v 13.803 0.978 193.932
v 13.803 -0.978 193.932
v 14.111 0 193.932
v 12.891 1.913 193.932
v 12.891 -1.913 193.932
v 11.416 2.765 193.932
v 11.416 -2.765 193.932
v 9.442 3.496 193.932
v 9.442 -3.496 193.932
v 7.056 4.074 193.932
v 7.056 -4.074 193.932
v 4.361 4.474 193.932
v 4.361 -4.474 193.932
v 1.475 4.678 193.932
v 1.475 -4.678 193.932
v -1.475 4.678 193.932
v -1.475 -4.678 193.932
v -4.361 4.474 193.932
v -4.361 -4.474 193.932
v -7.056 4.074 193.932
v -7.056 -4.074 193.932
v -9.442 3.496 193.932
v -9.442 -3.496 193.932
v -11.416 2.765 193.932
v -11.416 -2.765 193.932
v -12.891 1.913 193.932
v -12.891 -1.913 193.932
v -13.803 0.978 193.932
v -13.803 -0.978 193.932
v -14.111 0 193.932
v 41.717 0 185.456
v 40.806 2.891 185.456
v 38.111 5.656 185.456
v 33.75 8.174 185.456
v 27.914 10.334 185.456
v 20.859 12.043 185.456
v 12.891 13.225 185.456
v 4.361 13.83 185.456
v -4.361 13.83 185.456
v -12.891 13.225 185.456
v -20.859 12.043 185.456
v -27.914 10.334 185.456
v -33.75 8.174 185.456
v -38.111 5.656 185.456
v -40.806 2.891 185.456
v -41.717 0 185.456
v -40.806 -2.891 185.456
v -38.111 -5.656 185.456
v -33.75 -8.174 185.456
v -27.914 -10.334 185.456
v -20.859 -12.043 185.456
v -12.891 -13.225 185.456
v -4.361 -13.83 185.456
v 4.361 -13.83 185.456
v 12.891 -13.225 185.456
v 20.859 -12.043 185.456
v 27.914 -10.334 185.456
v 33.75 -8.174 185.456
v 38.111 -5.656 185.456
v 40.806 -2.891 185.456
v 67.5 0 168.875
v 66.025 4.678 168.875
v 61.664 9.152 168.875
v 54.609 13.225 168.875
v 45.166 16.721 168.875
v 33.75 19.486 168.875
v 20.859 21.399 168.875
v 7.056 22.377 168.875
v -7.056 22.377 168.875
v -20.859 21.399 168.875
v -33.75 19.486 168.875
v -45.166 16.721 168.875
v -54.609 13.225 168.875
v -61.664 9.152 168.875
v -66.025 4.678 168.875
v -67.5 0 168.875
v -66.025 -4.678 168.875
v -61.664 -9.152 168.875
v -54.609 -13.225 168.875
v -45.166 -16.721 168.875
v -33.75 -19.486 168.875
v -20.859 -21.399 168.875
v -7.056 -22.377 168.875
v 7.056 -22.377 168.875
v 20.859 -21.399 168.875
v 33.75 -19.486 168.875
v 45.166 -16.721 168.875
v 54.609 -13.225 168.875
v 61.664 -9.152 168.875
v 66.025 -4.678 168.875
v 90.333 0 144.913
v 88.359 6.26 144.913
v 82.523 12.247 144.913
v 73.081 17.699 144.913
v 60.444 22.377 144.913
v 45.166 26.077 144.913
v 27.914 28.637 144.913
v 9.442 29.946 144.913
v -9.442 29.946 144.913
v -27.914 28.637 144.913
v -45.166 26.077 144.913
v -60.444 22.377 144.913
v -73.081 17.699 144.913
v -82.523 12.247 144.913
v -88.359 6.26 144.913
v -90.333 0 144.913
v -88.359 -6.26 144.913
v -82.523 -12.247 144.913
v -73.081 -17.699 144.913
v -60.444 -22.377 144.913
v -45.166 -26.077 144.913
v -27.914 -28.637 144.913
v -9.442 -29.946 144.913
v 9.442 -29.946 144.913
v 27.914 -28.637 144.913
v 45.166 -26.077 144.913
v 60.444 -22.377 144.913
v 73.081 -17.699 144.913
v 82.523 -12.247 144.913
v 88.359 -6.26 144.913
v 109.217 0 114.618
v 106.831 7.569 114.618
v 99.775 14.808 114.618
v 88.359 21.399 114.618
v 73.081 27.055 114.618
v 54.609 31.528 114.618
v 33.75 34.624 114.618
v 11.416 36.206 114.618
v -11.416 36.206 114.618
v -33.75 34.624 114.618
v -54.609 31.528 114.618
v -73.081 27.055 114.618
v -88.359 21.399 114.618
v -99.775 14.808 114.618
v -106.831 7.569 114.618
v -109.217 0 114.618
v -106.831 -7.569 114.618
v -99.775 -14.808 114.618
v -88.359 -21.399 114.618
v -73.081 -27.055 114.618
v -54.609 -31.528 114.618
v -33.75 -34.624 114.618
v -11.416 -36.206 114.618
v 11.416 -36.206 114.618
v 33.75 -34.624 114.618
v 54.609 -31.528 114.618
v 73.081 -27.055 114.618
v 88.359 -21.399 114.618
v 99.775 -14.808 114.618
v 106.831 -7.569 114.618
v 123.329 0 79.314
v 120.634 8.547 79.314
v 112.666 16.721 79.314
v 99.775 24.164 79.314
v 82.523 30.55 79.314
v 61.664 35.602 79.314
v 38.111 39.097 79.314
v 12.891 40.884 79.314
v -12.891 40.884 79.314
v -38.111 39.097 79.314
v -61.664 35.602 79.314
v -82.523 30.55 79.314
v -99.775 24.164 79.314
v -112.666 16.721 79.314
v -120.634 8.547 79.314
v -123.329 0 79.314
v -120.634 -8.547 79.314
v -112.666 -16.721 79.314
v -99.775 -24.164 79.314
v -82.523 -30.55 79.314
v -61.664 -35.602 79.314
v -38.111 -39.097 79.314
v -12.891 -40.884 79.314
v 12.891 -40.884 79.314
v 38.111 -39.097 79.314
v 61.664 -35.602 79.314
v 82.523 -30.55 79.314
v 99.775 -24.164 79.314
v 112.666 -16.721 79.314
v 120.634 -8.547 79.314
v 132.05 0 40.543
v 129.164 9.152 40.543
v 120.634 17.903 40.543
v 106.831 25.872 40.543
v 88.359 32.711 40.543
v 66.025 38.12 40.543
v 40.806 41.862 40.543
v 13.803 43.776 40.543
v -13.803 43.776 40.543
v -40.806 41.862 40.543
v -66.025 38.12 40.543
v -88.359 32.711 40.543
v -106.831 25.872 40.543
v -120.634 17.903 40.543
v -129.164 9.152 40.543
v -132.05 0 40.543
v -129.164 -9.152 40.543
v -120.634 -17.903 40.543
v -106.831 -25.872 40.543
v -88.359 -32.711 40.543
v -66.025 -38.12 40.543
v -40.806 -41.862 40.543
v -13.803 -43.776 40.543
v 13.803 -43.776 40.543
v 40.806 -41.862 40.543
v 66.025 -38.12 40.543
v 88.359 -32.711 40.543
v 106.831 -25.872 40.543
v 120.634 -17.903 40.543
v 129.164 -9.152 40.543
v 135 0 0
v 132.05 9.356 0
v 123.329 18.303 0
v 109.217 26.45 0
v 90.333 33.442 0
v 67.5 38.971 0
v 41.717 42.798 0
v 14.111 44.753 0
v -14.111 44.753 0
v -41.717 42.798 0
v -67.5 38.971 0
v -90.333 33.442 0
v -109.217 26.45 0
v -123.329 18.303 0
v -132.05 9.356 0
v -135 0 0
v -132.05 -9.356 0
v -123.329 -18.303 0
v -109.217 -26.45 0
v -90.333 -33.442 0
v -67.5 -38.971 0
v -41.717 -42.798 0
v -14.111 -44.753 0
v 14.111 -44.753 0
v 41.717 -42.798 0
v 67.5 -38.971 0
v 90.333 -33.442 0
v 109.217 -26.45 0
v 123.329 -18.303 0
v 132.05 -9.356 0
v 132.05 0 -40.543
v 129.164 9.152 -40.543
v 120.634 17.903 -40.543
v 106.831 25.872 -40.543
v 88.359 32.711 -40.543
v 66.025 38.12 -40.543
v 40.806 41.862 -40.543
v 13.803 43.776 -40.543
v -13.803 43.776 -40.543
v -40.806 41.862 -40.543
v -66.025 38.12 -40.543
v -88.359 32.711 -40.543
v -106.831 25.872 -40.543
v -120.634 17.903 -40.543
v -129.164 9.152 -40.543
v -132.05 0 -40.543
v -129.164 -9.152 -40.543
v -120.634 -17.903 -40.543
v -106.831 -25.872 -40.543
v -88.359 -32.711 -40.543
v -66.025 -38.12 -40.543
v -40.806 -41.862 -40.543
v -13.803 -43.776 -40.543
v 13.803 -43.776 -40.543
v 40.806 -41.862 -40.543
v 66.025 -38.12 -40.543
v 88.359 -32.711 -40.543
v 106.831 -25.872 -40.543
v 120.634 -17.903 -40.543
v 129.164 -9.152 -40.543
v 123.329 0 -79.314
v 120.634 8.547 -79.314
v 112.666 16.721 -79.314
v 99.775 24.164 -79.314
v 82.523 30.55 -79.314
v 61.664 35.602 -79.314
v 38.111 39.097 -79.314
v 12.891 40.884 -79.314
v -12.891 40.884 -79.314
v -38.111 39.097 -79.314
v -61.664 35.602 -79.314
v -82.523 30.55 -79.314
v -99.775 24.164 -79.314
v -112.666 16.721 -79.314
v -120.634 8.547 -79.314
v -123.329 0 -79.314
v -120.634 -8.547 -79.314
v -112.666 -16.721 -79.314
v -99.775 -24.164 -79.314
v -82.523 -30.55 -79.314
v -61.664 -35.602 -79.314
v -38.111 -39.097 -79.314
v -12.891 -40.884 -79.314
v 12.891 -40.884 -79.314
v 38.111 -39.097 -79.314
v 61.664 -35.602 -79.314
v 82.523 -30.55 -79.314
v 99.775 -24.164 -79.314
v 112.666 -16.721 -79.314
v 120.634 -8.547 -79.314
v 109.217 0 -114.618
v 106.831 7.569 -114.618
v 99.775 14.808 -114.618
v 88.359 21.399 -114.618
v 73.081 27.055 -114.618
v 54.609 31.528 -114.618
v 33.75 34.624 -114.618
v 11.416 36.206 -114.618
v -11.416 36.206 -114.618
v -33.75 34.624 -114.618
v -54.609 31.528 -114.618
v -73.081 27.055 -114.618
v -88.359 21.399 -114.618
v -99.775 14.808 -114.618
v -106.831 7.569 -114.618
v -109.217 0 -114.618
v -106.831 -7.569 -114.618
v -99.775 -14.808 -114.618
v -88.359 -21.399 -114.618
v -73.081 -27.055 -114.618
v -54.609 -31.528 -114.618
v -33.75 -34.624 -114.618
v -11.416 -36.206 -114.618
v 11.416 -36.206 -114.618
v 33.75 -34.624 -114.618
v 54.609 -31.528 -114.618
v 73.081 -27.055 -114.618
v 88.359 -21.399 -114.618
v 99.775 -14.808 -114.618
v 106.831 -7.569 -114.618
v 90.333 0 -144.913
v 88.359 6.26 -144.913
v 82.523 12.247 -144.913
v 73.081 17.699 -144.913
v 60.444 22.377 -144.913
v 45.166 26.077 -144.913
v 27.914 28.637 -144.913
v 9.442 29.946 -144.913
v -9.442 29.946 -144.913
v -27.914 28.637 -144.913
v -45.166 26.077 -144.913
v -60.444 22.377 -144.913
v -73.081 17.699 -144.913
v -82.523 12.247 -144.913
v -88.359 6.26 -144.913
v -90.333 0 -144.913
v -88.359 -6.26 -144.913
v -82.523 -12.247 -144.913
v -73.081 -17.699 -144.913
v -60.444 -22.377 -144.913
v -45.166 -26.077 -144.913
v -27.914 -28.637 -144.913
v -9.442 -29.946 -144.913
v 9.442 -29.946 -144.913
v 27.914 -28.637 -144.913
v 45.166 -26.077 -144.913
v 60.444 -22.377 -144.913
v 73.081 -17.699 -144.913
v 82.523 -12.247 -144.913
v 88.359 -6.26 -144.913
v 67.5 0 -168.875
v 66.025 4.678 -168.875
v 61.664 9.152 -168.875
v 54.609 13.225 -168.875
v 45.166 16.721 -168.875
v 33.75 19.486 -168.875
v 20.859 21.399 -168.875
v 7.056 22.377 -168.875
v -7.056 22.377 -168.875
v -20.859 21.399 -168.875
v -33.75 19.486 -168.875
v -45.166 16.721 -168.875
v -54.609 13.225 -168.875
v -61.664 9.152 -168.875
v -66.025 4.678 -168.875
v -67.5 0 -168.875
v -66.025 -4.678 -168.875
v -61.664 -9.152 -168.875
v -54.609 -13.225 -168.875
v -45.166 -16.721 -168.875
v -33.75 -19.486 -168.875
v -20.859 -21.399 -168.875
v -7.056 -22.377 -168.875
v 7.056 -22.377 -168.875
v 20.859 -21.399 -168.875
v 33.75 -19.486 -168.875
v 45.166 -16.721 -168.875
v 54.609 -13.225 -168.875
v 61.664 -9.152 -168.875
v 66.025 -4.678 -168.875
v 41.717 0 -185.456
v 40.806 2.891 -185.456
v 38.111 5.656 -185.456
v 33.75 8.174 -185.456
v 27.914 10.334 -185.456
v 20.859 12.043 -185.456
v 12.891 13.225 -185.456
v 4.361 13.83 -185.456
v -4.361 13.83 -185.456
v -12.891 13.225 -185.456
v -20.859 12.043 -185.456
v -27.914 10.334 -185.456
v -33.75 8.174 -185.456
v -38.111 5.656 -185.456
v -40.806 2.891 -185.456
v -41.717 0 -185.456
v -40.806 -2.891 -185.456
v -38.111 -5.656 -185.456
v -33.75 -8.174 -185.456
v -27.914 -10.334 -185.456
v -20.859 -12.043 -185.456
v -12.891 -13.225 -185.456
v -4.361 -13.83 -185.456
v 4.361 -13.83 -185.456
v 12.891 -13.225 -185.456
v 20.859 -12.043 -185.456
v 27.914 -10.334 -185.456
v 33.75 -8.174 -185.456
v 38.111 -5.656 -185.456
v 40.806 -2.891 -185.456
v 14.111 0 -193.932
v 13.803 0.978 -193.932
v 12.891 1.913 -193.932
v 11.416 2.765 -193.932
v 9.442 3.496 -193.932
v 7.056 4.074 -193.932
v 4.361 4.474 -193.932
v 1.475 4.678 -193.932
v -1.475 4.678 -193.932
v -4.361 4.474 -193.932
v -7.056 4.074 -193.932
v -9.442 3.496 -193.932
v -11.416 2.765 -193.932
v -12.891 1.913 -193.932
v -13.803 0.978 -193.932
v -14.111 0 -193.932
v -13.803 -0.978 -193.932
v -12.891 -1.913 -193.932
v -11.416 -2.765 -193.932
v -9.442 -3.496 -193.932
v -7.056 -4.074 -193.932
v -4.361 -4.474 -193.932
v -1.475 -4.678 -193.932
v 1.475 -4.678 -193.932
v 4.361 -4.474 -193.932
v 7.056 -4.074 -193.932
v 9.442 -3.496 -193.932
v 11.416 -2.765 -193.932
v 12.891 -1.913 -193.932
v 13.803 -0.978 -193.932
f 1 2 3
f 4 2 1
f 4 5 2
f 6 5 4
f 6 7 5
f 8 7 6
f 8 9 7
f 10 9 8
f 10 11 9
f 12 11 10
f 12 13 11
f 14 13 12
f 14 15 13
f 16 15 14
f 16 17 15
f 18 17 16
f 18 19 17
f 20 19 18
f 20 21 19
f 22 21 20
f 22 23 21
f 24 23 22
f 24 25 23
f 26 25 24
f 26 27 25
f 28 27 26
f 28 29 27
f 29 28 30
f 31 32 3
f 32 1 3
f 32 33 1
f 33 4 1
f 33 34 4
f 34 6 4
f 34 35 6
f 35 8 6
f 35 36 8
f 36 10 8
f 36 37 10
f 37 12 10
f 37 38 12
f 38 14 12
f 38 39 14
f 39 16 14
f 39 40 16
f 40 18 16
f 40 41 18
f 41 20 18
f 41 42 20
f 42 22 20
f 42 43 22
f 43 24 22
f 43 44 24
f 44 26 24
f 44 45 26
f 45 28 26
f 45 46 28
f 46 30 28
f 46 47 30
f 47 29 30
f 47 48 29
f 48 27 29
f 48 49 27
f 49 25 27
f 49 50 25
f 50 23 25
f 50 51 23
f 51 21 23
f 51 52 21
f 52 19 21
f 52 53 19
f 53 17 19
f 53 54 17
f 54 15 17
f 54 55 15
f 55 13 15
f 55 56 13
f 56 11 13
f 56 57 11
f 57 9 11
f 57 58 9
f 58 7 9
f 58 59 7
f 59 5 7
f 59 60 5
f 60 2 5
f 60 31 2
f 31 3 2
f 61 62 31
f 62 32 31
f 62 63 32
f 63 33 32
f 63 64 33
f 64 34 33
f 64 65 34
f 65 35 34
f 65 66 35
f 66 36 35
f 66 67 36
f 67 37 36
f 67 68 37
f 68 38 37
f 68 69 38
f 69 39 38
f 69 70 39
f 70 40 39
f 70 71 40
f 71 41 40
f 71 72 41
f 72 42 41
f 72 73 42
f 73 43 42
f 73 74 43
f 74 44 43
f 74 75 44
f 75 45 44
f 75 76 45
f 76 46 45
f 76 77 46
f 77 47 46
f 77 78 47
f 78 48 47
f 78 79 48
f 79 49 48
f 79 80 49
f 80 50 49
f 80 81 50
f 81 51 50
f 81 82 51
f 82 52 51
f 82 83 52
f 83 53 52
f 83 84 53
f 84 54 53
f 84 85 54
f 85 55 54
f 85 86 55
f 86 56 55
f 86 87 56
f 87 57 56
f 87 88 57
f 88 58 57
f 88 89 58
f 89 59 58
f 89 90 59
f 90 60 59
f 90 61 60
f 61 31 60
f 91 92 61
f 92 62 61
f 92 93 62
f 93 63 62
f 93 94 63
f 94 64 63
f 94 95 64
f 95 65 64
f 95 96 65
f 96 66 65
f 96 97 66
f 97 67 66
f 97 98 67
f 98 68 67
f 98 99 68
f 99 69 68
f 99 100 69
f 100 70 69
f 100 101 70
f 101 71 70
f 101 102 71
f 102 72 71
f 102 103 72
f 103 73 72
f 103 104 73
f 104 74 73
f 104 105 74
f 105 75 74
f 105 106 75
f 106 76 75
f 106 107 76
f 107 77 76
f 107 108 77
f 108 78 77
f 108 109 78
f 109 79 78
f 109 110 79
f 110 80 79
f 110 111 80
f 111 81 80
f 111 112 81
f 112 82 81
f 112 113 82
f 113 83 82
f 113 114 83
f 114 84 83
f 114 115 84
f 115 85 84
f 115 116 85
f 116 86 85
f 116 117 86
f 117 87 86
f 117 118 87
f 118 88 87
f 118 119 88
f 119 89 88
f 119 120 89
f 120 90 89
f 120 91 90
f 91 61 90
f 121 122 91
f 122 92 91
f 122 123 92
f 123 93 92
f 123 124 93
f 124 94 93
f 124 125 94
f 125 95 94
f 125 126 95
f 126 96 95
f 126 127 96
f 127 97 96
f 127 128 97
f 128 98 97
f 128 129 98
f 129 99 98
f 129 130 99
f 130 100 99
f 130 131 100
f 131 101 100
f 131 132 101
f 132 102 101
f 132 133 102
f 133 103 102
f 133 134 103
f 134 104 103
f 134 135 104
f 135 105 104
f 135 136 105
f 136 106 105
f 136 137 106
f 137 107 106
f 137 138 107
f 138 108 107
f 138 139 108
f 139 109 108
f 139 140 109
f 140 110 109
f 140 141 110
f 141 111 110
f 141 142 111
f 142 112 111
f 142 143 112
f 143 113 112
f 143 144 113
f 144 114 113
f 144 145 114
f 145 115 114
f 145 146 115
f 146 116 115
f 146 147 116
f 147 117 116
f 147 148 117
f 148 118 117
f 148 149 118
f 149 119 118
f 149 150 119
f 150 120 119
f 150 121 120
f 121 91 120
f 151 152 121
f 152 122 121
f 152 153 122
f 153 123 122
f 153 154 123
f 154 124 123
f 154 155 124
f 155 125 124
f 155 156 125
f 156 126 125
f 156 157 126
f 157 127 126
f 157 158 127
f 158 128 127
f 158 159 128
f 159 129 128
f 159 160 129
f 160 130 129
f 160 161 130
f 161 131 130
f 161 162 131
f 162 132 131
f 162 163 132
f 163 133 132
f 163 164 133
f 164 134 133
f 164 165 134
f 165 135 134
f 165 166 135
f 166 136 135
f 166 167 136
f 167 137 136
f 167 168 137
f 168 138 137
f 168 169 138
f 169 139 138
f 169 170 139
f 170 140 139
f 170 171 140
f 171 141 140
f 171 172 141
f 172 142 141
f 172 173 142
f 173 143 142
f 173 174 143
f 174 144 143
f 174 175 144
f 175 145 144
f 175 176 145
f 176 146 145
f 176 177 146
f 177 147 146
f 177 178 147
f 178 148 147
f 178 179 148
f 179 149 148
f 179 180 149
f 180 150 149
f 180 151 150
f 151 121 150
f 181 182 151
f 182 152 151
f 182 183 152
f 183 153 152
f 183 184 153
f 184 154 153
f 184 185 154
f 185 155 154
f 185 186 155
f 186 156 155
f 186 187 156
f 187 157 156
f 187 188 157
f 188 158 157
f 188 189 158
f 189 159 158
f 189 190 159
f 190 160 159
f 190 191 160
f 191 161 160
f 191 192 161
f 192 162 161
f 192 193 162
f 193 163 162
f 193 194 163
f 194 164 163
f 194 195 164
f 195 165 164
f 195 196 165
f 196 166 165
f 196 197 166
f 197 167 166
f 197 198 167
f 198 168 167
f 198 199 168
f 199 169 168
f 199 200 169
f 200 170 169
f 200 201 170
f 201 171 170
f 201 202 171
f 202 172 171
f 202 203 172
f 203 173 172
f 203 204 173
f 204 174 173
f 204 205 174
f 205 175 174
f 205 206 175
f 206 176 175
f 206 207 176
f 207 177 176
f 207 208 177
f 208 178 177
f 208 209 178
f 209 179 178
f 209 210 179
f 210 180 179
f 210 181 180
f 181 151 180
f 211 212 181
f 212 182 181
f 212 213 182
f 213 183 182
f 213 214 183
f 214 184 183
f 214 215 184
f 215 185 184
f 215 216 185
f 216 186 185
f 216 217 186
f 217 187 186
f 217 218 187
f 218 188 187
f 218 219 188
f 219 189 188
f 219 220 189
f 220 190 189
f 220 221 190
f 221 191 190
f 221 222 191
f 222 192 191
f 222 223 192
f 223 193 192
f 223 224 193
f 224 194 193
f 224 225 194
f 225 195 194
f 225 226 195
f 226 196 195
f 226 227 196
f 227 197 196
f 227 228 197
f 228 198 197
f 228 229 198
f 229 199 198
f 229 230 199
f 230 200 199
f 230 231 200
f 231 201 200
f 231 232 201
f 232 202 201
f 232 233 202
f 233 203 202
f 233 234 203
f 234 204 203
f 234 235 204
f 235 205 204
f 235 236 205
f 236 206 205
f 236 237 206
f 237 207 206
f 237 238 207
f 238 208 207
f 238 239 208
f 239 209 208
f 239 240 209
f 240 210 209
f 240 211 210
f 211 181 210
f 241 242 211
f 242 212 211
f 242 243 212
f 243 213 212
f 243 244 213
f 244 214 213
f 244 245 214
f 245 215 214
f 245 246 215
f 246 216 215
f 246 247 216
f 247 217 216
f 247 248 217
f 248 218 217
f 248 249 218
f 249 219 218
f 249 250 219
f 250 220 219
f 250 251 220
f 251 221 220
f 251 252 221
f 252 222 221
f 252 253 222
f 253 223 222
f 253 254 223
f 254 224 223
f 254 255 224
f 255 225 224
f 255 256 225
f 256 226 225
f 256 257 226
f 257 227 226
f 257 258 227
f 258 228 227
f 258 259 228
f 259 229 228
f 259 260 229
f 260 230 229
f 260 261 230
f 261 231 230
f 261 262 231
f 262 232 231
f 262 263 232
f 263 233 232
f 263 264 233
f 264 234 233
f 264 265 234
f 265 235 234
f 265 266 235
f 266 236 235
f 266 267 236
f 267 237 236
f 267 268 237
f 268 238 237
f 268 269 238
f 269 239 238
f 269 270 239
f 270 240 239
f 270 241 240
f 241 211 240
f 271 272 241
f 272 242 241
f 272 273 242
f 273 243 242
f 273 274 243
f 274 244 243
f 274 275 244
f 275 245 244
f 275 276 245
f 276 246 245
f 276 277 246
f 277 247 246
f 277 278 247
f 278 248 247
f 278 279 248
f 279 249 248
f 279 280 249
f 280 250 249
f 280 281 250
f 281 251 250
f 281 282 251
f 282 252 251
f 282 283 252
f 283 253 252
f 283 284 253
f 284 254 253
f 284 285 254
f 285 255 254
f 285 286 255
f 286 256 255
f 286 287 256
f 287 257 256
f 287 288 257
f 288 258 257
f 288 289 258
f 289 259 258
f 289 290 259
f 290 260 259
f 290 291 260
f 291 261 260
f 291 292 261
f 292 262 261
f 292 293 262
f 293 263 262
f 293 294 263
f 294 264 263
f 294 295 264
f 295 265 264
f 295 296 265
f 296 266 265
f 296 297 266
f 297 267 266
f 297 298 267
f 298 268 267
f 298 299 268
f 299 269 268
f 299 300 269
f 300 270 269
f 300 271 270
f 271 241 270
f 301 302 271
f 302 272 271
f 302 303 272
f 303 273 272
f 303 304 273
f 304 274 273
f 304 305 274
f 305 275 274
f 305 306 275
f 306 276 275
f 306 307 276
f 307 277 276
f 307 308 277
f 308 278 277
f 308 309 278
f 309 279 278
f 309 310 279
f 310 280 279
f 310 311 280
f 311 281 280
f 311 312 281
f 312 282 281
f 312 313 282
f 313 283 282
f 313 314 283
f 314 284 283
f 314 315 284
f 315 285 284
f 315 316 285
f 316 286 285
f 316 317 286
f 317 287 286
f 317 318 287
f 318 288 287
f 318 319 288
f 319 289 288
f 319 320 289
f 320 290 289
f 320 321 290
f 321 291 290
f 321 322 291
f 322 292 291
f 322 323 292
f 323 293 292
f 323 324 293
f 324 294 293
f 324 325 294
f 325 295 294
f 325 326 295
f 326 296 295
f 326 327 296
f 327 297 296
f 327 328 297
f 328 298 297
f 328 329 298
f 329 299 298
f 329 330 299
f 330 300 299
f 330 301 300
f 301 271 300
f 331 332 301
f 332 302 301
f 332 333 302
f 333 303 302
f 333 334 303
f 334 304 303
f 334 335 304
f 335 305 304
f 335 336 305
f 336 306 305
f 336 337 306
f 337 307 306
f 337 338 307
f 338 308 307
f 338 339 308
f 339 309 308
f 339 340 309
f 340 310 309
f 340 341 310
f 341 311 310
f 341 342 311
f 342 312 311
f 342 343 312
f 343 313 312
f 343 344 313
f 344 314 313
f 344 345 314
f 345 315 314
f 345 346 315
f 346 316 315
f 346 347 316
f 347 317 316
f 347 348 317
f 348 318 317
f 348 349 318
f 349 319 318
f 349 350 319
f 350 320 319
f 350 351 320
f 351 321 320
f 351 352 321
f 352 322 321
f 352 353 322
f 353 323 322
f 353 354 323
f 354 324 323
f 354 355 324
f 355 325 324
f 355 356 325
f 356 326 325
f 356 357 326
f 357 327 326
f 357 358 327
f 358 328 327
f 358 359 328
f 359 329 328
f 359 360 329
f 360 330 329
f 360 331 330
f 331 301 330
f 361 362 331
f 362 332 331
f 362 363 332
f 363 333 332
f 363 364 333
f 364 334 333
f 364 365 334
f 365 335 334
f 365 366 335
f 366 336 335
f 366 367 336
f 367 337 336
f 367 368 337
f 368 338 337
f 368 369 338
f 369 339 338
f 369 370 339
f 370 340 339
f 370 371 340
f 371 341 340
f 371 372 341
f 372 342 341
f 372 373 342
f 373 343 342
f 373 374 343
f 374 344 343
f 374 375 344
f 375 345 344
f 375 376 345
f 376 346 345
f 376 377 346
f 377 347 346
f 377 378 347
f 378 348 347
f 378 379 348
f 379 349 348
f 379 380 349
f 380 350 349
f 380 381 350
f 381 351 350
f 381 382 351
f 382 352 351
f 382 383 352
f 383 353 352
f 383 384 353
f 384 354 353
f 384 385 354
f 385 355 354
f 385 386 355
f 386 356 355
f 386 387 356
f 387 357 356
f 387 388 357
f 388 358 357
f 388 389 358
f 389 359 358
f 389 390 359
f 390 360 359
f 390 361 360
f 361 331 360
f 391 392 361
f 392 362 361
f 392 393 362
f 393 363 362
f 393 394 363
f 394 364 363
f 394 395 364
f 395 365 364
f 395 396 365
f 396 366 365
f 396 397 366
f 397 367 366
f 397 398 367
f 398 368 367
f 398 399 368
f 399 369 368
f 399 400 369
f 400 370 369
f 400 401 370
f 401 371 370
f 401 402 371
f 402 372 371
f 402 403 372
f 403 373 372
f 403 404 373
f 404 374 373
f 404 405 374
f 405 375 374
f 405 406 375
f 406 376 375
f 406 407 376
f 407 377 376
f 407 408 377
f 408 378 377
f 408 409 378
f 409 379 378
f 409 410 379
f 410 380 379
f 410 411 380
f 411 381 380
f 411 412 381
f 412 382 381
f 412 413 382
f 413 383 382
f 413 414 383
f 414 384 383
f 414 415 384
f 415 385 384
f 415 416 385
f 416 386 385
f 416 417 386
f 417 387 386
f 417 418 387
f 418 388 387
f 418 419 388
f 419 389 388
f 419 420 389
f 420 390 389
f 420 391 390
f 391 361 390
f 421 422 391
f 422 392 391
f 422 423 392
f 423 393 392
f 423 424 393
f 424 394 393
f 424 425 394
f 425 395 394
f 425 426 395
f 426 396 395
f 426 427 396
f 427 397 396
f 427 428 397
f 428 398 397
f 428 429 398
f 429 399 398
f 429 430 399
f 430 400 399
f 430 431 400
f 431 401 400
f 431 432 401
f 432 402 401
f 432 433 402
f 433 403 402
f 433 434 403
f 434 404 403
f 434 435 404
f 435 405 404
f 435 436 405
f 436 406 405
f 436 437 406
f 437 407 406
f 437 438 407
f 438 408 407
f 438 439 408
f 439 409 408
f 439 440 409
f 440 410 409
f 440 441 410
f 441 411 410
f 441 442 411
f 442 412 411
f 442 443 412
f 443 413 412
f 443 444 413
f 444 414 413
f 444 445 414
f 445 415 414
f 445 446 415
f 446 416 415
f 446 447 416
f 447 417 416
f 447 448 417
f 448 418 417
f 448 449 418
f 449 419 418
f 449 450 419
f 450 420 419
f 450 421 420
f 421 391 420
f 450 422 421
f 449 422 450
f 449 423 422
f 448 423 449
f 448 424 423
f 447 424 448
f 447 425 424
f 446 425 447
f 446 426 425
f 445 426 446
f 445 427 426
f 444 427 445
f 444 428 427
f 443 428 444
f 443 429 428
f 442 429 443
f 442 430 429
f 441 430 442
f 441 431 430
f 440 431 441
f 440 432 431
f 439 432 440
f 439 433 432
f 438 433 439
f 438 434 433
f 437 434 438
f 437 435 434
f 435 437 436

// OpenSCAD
// Generated by SolidPython 1.0.1 on 2020-07-29 00:46:48


scale(v = [9, 3, 13]) {
	sphere(r = 15);
}
/***********************************************
*********      SolidPython code:      **********
************************************************
 
# import packages: SolidPython
from solid import *
from solid.utils import *
from itertools import chain, combinations, permutations


class Resize:

    def __init__(self, scad_file):
        self.scad_file = scad_file
        #self.scad_file = import_scad(scad_file)
        # cone/cylinder param:
        self.r1 = 0
        self.r2 = 0
        self.h = 0
        # rectangular prism param:
        self.w = 0
        self.l = 0
        # ellipse param:
        self.r = 0

    # import OpenScad code (file name corresponds to shape)


    # classify shape + parameters
    def assign(self, param1, param2, param3):
        if self.scad_file == 'cone.scad':
            self.r1 = param1
            self.r2 = param2
            self.h = param3
        elif self.scad_file == 'cylinder.scad':
            self.r1 = param1
            self.r2 = param2
            self.h = param3
        elif self.scad_file == 'rectangularPrism.scad':
            self.h = param1
            self.l = param2
            self.w = param3
        else:
            self.r = param1
            self.h = param2

    # resize parameters
    def iterate(self):
        x = range(3, 20, 2)
        i = 1
        if self.scad_file == 'cone.scad':
            tempList = list(permutations(x, 2))
            for temp in tempList:
                param1 = temp[0]
                param2 = temp[1]
                filepath = 'produced_scad_files/' + 'cone' + str(param1) + '_' + str(param2) + '_' + '.scad'
                scad_render_to_file(cylinder(h=param1, r1=param2, r2=0), filepath)

        elif self.scad_file == 'cylinder.scad':
            tempList = list(permutations(x, 3))
            for temp in tempList:
                param1 = temp[0]
                param2 = temp[1]
                filepath = 'produced_scad_files/' + 'cylinder' + str(param1) + '_' + str(param2) + '_' + '.scad'
                scad_render_to_file(cylinder(h=param1, r1=param2, r2=param2), filepath)

        elif self.scad_file == 'rectangularPrism.scad':
            tempList = list(permutations(x, 3))
            for temp in tempList:
                param1 = temp[0]
                param2 = temp[1]
                param3 = temp[2]
                filepath = 'produced_scad_files/' + 'rectangularPrism' + str(param1) + '_' + str(param2) + '_' + str(
                    param3) + '.scad'
                scad_render_to_file(cube(size=(param1, param2, param3)), filepath)

        elif self.scad_file == 'ellipse.scad':
            tempList = list(permutations(x, 4))
            for temp in tempList:
                param1 = temp[0]
                param2 = temp[1]
                param3 = temp[2]
                param4 = temp[3]
                filepath = 'produced_scad_files/' + 'ellipse' + str(param1) + '_' + str(param2) + '_' + str(param3) + '_' + str(param4) + '.scad'
                scad_render_to_file(scale([param1, param2, param3])(sphere(r=param4)), filepath)

    def render_to_scadfile(self):
        scad_render_to_file(scad, 'example.scad') 
 
************************************************/
